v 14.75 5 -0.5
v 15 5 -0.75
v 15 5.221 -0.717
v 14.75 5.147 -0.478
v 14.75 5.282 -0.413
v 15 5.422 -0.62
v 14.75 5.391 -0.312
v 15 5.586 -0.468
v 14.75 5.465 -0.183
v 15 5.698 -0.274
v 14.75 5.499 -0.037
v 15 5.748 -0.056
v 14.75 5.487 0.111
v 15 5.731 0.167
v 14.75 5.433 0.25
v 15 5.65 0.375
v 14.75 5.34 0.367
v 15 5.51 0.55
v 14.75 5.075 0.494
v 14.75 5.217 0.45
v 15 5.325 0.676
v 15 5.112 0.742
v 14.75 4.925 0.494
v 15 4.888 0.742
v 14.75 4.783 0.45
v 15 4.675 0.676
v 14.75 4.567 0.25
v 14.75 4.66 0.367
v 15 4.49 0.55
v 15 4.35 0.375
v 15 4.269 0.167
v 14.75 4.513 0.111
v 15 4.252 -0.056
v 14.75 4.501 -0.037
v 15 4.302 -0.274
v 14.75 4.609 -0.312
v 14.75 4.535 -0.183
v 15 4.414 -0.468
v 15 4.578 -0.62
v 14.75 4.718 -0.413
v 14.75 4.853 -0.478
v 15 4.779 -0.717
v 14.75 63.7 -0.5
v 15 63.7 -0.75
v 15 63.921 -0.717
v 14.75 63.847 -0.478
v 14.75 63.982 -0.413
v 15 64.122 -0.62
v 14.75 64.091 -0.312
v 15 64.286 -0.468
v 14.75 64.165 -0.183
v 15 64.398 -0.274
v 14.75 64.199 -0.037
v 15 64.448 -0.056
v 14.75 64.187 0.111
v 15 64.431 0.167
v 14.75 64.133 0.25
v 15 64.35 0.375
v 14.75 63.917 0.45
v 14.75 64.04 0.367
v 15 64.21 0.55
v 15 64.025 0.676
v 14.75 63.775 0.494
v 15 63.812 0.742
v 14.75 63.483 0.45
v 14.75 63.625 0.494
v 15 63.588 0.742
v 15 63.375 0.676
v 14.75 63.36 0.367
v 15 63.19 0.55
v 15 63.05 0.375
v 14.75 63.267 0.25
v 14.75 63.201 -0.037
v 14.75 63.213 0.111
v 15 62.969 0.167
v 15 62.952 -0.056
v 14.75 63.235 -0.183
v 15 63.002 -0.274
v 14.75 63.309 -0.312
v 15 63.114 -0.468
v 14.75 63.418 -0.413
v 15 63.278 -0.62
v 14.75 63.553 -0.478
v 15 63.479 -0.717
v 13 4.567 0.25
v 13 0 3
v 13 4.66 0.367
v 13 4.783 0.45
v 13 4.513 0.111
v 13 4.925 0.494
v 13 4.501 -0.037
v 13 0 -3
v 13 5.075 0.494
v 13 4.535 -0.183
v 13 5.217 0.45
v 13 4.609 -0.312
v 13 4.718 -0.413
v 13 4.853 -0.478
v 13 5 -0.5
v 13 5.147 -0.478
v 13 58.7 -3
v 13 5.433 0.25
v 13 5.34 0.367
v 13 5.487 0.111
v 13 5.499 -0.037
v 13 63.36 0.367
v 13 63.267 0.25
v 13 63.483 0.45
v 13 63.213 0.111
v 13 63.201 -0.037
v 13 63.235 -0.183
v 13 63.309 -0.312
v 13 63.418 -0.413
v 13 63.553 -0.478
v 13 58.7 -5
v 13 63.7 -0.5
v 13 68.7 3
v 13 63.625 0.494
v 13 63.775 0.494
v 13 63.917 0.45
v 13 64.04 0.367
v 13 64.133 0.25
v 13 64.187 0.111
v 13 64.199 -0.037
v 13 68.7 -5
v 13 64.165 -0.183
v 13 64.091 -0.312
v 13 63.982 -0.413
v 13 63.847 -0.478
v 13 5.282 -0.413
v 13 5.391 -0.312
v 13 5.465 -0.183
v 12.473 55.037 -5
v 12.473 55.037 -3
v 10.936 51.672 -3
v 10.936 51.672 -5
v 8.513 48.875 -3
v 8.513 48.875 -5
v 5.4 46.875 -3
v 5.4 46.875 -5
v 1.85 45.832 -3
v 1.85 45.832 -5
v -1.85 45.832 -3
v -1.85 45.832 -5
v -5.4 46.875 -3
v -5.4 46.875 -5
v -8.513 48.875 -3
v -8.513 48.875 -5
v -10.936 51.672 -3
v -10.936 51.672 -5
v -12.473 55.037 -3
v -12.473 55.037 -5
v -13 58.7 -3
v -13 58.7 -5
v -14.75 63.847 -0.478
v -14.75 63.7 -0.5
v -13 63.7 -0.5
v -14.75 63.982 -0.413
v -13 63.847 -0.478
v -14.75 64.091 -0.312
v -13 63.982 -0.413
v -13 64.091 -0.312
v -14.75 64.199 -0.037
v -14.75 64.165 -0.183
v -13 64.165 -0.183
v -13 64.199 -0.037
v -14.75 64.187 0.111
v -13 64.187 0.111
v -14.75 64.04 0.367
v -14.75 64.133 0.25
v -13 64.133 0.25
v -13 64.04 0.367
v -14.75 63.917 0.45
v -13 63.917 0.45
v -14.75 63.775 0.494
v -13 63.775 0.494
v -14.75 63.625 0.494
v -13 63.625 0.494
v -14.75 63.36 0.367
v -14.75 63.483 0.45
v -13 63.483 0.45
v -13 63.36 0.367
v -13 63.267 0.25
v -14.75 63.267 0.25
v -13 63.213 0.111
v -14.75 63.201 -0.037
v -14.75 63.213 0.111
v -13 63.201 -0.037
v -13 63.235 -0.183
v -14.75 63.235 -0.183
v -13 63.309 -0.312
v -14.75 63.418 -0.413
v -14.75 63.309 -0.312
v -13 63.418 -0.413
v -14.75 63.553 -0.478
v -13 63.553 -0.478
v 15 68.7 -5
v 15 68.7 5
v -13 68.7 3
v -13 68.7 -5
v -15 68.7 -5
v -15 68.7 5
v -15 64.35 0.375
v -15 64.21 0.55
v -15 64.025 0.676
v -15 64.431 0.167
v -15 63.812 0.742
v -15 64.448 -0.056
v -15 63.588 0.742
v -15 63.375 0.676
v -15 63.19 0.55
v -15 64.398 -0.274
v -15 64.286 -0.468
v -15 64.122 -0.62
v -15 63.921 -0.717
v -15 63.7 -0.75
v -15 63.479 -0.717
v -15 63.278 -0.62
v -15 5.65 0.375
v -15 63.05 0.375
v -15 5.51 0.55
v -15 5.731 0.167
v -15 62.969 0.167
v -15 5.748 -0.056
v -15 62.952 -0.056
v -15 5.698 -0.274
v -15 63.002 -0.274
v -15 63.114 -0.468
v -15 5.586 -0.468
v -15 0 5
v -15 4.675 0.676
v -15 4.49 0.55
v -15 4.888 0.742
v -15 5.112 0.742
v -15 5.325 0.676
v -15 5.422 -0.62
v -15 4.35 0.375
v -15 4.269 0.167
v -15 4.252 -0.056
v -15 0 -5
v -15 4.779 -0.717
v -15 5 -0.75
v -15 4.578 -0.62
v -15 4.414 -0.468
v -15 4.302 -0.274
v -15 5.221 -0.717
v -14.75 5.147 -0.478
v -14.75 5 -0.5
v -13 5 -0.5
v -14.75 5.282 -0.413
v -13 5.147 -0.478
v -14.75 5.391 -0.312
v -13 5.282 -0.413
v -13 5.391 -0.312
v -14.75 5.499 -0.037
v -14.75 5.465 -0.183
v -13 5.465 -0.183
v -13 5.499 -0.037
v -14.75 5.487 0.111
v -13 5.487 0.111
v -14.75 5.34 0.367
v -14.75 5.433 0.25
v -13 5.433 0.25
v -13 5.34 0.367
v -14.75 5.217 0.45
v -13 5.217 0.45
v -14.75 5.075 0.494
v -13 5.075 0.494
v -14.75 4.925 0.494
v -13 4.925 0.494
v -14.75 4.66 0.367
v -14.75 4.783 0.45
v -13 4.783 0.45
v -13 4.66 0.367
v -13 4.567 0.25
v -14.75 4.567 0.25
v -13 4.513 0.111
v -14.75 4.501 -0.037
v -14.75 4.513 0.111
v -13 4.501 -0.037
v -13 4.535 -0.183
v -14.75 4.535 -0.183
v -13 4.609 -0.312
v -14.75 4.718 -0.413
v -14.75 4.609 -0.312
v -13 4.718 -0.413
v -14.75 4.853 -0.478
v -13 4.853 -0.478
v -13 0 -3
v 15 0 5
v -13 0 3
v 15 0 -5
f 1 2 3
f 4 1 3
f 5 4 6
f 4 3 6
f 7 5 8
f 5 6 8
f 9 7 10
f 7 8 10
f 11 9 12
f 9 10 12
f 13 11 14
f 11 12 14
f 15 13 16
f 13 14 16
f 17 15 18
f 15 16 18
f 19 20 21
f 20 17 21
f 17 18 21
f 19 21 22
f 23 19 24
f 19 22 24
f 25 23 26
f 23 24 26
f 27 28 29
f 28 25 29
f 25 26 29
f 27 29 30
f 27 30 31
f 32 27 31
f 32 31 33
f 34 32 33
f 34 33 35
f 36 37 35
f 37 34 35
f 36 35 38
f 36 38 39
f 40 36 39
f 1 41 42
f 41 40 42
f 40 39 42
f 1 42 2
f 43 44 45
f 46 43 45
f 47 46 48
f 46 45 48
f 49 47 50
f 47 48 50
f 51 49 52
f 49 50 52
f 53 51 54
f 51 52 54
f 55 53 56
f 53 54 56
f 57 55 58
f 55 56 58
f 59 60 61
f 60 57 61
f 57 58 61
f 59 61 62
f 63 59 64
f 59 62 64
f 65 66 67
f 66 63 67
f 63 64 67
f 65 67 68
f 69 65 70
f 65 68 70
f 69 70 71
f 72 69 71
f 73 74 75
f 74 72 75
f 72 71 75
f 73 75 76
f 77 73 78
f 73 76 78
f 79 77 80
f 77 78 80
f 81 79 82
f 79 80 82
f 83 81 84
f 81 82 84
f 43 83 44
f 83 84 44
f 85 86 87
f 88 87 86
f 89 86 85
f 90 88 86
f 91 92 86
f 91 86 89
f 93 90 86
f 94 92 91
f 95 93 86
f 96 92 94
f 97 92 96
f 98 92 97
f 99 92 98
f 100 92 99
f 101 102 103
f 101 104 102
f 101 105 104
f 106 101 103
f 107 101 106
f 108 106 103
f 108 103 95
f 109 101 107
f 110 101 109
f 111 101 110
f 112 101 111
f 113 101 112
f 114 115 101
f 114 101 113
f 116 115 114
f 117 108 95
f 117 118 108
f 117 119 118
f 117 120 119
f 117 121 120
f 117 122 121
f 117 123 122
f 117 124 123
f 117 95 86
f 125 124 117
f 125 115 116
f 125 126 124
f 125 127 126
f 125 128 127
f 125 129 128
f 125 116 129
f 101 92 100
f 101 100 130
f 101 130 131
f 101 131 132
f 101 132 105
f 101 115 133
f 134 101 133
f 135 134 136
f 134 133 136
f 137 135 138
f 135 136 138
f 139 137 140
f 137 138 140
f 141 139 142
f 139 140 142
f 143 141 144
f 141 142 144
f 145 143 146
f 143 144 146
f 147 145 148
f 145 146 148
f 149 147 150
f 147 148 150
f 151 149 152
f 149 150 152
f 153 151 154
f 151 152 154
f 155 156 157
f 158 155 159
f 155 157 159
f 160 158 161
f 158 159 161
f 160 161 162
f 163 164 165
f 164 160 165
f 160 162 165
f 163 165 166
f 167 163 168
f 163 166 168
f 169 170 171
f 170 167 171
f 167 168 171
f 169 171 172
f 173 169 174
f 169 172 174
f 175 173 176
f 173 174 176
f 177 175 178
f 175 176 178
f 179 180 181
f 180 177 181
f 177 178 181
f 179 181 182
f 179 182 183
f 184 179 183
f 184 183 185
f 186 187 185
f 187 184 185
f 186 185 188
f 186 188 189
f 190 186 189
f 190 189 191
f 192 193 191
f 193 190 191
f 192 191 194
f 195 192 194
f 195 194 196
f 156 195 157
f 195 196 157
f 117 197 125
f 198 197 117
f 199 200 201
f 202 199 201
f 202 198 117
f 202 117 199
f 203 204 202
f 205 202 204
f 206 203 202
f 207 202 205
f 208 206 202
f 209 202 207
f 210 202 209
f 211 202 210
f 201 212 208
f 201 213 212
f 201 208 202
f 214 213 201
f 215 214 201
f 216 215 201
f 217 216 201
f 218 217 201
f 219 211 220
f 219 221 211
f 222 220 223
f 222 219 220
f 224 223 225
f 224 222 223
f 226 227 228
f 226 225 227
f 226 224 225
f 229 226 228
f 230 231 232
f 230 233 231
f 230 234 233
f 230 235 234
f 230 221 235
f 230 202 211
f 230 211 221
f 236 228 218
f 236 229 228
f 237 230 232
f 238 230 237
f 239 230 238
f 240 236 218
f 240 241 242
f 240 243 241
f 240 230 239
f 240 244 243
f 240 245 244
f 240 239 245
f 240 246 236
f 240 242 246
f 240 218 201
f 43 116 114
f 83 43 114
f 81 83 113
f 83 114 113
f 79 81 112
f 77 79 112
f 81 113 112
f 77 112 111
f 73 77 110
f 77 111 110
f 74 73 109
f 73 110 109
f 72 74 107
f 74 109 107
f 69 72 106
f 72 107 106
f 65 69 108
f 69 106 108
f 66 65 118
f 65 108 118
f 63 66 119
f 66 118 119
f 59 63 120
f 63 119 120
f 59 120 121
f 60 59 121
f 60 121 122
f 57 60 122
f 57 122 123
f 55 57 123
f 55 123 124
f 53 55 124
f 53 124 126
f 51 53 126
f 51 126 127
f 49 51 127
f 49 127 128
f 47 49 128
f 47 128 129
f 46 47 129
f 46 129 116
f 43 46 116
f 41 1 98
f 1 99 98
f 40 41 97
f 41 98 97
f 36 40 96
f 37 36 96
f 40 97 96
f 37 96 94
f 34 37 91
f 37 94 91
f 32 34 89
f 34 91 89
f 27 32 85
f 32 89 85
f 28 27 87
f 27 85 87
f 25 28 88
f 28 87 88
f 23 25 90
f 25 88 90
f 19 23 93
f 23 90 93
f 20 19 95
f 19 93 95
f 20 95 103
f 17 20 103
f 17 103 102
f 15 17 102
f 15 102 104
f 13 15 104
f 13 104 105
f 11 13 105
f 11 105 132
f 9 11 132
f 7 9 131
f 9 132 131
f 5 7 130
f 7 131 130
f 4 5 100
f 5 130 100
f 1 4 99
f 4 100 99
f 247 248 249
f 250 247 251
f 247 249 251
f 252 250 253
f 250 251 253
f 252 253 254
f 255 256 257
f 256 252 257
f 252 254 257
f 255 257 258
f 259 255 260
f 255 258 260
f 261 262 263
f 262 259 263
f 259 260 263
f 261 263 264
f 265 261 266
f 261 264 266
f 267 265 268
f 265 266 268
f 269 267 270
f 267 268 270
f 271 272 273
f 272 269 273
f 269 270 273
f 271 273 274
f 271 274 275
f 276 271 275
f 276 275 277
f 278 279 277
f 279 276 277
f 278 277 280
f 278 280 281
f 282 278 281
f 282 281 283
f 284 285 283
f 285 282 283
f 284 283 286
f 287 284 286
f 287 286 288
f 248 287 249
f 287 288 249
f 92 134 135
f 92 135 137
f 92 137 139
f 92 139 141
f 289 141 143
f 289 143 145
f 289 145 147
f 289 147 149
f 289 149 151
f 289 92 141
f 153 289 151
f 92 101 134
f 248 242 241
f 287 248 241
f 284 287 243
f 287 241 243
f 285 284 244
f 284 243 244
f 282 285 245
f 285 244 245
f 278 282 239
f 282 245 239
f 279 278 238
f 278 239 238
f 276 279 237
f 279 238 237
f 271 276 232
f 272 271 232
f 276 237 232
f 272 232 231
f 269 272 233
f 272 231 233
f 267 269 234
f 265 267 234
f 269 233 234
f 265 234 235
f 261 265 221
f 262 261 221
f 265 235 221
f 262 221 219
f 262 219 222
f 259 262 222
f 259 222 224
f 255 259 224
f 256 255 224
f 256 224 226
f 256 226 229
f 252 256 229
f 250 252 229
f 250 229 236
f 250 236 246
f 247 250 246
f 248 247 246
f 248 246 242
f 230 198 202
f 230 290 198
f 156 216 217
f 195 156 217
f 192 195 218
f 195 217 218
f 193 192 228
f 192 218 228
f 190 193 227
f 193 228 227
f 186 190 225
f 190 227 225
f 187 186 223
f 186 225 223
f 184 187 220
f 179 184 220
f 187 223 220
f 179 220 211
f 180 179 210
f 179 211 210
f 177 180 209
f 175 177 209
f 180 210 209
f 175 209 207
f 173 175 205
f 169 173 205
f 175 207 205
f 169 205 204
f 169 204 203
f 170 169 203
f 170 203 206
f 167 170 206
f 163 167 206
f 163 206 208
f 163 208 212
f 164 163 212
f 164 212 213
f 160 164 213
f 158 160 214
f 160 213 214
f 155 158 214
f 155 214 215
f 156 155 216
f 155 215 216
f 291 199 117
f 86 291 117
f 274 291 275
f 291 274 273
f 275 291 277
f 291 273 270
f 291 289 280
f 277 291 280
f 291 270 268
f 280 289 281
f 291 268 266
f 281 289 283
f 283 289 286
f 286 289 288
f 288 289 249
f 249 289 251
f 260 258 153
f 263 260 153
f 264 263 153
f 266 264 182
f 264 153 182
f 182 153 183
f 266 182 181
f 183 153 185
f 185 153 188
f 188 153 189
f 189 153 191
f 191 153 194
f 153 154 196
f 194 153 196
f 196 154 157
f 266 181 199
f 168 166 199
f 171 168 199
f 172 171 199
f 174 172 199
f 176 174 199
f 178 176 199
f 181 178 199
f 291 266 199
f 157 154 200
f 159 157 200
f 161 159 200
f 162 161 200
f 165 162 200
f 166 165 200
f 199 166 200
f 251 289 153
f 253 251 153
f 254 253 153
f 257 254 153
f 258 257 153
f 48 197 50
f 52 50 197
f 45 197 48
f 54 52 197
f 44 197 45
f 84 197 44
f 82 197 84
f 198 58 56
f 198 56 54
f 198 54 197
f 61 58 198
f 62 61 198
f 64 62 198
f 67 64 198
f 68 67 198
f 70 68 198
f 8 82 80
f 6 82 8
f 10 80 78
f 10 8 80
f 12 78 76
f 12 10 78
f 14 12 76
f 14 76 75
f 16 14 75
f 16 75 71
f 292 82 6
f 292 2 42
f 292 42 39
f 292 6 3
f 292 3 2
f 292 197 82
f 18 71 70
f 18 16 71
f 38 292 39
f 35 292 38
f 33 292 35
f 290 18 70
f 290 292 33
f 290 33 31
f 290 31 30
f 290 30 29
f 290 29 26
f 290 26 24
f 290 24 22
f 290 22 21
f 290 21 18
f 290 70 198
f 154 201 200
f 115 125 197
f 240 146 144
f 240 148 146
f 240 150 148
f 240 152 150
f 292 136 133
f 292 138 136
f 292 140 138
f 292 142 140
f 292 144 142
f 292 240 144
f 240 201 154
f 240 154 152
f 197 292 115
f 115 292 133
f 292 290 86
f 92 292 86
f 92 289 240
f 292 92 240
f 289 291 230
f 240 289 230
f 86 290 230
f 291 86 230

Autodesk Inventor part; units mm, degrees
ref_plane "YZ Plane" through (0, 0, 0) normal (1, 0, 0) x (0, 1, 0)
ref_plane "XZ Plane" through (0, 0, 0) normal (0, 1, 0) x (-1, 0, 0)
ref_plane "XY Plane" through (0, 0, 0) normal (0, 0, 1) x (1, 0, 0)
sketch "Эскиз1" plane through (0, 0, 0) normal (0, 1, 0) x (-1, 0, 0)
  line L0 (15, -5) -> (-15, -5)
  line L1 (-15, -5) -> (-15, 5)
  line L2 (-15, 5) -> (15, 5)
  line L3 (15, 5) -> (15, -5)
  line L4 (-15, -5) -> (15, 5) construction
  line L5 (15, -5) -> (-15, 5) construction
  line L6 (-13, -3) -> (13, -3)
  line L7 (13, -3) -> (13, 3)
  line L8 (13, 3) -> (-13, 3)
  line L9 (-13, 3) -> (-13, -3)
  point P0 (0, 0)
  point P1 (0, 0)
  dimension "d0" = 30
  dimension "d1" = 10
  dimension "d2" = 2
extrude "Выдавливание1" add sketch "Эскиз1" along normal blind 68.7
sketch "Эскиз2" plane through (15, 0, 5) normal (1, 0, 0) x (0, 0, -1)
  line L0 (0, 68.7) -> (10, 68.7) construction
  line L1 (10, 68.7) -> (0, 58.7) construction
  line L2 (0, 0) -> (0, 68.7) construction
  line L3 (0, 68.7) -> (10, 58.7) construction
  line L4 (10, 0) -> (10, 68.7) construction
  line L5 (10, 0) -> (0, 10) construction
  line L6 (0, 0) -> (10, 10) construction
  circle A0 centre (5, 63.7) radius 0.5
  circle A1 centre (5, 5) radius 0.5
  point P0 (5, 0)
  dimension "d5" = 1
  dimension "d6" = 1
sketch "Эскиз3" plane through (15, 0, -5) normal (0, 0, -1) x (-1, 0, 0)
  line L0 (0, 0) -> (0, 68.7) projected
  line L1 (30, 0) -> (30, 68.7) projected
  line L2 (30, 0) -> (30, 68.7) projected
  line L3 (0, 0) -> (0, 68.7) projected
  line L4 (0, 68.7) -> (30, 68.7) projected
  arc A0 (2, 58.7) -> (28, 58.7) centre (15, 58.7) ccw
  line L5 (28, 0) -> (28, 68.7) projected
  line L6 (2, 0) -> (2, 68.7) projected
  line L7 (28, 0) -> (28, 68.7) projected
  line L8 (28, 58.7) -> (28, 68.7)
  line L9 (28, 68.7) -> (2, 68.7)
  line L10 (2, 58.7) -> (2, 68.7)
  point P0 (15, 0)
  dimension "d10" = 10
extrude "Выдавливание3" cut sketch "Эскиз3" against normal up to surface (2 mm away)
hole "Отверстие1" at (15, 63.7, 0) at (15, 5, 0) direction (-1, 0, 0) diameter 1 depth 15 countersink diameter 1.5 countersink angle 90
mirror "Зеркальное отражение1" about plane through (0, 0, 0) normal (1, 0, 0) of "Отверстие1"
properties part number "board-1-new"
